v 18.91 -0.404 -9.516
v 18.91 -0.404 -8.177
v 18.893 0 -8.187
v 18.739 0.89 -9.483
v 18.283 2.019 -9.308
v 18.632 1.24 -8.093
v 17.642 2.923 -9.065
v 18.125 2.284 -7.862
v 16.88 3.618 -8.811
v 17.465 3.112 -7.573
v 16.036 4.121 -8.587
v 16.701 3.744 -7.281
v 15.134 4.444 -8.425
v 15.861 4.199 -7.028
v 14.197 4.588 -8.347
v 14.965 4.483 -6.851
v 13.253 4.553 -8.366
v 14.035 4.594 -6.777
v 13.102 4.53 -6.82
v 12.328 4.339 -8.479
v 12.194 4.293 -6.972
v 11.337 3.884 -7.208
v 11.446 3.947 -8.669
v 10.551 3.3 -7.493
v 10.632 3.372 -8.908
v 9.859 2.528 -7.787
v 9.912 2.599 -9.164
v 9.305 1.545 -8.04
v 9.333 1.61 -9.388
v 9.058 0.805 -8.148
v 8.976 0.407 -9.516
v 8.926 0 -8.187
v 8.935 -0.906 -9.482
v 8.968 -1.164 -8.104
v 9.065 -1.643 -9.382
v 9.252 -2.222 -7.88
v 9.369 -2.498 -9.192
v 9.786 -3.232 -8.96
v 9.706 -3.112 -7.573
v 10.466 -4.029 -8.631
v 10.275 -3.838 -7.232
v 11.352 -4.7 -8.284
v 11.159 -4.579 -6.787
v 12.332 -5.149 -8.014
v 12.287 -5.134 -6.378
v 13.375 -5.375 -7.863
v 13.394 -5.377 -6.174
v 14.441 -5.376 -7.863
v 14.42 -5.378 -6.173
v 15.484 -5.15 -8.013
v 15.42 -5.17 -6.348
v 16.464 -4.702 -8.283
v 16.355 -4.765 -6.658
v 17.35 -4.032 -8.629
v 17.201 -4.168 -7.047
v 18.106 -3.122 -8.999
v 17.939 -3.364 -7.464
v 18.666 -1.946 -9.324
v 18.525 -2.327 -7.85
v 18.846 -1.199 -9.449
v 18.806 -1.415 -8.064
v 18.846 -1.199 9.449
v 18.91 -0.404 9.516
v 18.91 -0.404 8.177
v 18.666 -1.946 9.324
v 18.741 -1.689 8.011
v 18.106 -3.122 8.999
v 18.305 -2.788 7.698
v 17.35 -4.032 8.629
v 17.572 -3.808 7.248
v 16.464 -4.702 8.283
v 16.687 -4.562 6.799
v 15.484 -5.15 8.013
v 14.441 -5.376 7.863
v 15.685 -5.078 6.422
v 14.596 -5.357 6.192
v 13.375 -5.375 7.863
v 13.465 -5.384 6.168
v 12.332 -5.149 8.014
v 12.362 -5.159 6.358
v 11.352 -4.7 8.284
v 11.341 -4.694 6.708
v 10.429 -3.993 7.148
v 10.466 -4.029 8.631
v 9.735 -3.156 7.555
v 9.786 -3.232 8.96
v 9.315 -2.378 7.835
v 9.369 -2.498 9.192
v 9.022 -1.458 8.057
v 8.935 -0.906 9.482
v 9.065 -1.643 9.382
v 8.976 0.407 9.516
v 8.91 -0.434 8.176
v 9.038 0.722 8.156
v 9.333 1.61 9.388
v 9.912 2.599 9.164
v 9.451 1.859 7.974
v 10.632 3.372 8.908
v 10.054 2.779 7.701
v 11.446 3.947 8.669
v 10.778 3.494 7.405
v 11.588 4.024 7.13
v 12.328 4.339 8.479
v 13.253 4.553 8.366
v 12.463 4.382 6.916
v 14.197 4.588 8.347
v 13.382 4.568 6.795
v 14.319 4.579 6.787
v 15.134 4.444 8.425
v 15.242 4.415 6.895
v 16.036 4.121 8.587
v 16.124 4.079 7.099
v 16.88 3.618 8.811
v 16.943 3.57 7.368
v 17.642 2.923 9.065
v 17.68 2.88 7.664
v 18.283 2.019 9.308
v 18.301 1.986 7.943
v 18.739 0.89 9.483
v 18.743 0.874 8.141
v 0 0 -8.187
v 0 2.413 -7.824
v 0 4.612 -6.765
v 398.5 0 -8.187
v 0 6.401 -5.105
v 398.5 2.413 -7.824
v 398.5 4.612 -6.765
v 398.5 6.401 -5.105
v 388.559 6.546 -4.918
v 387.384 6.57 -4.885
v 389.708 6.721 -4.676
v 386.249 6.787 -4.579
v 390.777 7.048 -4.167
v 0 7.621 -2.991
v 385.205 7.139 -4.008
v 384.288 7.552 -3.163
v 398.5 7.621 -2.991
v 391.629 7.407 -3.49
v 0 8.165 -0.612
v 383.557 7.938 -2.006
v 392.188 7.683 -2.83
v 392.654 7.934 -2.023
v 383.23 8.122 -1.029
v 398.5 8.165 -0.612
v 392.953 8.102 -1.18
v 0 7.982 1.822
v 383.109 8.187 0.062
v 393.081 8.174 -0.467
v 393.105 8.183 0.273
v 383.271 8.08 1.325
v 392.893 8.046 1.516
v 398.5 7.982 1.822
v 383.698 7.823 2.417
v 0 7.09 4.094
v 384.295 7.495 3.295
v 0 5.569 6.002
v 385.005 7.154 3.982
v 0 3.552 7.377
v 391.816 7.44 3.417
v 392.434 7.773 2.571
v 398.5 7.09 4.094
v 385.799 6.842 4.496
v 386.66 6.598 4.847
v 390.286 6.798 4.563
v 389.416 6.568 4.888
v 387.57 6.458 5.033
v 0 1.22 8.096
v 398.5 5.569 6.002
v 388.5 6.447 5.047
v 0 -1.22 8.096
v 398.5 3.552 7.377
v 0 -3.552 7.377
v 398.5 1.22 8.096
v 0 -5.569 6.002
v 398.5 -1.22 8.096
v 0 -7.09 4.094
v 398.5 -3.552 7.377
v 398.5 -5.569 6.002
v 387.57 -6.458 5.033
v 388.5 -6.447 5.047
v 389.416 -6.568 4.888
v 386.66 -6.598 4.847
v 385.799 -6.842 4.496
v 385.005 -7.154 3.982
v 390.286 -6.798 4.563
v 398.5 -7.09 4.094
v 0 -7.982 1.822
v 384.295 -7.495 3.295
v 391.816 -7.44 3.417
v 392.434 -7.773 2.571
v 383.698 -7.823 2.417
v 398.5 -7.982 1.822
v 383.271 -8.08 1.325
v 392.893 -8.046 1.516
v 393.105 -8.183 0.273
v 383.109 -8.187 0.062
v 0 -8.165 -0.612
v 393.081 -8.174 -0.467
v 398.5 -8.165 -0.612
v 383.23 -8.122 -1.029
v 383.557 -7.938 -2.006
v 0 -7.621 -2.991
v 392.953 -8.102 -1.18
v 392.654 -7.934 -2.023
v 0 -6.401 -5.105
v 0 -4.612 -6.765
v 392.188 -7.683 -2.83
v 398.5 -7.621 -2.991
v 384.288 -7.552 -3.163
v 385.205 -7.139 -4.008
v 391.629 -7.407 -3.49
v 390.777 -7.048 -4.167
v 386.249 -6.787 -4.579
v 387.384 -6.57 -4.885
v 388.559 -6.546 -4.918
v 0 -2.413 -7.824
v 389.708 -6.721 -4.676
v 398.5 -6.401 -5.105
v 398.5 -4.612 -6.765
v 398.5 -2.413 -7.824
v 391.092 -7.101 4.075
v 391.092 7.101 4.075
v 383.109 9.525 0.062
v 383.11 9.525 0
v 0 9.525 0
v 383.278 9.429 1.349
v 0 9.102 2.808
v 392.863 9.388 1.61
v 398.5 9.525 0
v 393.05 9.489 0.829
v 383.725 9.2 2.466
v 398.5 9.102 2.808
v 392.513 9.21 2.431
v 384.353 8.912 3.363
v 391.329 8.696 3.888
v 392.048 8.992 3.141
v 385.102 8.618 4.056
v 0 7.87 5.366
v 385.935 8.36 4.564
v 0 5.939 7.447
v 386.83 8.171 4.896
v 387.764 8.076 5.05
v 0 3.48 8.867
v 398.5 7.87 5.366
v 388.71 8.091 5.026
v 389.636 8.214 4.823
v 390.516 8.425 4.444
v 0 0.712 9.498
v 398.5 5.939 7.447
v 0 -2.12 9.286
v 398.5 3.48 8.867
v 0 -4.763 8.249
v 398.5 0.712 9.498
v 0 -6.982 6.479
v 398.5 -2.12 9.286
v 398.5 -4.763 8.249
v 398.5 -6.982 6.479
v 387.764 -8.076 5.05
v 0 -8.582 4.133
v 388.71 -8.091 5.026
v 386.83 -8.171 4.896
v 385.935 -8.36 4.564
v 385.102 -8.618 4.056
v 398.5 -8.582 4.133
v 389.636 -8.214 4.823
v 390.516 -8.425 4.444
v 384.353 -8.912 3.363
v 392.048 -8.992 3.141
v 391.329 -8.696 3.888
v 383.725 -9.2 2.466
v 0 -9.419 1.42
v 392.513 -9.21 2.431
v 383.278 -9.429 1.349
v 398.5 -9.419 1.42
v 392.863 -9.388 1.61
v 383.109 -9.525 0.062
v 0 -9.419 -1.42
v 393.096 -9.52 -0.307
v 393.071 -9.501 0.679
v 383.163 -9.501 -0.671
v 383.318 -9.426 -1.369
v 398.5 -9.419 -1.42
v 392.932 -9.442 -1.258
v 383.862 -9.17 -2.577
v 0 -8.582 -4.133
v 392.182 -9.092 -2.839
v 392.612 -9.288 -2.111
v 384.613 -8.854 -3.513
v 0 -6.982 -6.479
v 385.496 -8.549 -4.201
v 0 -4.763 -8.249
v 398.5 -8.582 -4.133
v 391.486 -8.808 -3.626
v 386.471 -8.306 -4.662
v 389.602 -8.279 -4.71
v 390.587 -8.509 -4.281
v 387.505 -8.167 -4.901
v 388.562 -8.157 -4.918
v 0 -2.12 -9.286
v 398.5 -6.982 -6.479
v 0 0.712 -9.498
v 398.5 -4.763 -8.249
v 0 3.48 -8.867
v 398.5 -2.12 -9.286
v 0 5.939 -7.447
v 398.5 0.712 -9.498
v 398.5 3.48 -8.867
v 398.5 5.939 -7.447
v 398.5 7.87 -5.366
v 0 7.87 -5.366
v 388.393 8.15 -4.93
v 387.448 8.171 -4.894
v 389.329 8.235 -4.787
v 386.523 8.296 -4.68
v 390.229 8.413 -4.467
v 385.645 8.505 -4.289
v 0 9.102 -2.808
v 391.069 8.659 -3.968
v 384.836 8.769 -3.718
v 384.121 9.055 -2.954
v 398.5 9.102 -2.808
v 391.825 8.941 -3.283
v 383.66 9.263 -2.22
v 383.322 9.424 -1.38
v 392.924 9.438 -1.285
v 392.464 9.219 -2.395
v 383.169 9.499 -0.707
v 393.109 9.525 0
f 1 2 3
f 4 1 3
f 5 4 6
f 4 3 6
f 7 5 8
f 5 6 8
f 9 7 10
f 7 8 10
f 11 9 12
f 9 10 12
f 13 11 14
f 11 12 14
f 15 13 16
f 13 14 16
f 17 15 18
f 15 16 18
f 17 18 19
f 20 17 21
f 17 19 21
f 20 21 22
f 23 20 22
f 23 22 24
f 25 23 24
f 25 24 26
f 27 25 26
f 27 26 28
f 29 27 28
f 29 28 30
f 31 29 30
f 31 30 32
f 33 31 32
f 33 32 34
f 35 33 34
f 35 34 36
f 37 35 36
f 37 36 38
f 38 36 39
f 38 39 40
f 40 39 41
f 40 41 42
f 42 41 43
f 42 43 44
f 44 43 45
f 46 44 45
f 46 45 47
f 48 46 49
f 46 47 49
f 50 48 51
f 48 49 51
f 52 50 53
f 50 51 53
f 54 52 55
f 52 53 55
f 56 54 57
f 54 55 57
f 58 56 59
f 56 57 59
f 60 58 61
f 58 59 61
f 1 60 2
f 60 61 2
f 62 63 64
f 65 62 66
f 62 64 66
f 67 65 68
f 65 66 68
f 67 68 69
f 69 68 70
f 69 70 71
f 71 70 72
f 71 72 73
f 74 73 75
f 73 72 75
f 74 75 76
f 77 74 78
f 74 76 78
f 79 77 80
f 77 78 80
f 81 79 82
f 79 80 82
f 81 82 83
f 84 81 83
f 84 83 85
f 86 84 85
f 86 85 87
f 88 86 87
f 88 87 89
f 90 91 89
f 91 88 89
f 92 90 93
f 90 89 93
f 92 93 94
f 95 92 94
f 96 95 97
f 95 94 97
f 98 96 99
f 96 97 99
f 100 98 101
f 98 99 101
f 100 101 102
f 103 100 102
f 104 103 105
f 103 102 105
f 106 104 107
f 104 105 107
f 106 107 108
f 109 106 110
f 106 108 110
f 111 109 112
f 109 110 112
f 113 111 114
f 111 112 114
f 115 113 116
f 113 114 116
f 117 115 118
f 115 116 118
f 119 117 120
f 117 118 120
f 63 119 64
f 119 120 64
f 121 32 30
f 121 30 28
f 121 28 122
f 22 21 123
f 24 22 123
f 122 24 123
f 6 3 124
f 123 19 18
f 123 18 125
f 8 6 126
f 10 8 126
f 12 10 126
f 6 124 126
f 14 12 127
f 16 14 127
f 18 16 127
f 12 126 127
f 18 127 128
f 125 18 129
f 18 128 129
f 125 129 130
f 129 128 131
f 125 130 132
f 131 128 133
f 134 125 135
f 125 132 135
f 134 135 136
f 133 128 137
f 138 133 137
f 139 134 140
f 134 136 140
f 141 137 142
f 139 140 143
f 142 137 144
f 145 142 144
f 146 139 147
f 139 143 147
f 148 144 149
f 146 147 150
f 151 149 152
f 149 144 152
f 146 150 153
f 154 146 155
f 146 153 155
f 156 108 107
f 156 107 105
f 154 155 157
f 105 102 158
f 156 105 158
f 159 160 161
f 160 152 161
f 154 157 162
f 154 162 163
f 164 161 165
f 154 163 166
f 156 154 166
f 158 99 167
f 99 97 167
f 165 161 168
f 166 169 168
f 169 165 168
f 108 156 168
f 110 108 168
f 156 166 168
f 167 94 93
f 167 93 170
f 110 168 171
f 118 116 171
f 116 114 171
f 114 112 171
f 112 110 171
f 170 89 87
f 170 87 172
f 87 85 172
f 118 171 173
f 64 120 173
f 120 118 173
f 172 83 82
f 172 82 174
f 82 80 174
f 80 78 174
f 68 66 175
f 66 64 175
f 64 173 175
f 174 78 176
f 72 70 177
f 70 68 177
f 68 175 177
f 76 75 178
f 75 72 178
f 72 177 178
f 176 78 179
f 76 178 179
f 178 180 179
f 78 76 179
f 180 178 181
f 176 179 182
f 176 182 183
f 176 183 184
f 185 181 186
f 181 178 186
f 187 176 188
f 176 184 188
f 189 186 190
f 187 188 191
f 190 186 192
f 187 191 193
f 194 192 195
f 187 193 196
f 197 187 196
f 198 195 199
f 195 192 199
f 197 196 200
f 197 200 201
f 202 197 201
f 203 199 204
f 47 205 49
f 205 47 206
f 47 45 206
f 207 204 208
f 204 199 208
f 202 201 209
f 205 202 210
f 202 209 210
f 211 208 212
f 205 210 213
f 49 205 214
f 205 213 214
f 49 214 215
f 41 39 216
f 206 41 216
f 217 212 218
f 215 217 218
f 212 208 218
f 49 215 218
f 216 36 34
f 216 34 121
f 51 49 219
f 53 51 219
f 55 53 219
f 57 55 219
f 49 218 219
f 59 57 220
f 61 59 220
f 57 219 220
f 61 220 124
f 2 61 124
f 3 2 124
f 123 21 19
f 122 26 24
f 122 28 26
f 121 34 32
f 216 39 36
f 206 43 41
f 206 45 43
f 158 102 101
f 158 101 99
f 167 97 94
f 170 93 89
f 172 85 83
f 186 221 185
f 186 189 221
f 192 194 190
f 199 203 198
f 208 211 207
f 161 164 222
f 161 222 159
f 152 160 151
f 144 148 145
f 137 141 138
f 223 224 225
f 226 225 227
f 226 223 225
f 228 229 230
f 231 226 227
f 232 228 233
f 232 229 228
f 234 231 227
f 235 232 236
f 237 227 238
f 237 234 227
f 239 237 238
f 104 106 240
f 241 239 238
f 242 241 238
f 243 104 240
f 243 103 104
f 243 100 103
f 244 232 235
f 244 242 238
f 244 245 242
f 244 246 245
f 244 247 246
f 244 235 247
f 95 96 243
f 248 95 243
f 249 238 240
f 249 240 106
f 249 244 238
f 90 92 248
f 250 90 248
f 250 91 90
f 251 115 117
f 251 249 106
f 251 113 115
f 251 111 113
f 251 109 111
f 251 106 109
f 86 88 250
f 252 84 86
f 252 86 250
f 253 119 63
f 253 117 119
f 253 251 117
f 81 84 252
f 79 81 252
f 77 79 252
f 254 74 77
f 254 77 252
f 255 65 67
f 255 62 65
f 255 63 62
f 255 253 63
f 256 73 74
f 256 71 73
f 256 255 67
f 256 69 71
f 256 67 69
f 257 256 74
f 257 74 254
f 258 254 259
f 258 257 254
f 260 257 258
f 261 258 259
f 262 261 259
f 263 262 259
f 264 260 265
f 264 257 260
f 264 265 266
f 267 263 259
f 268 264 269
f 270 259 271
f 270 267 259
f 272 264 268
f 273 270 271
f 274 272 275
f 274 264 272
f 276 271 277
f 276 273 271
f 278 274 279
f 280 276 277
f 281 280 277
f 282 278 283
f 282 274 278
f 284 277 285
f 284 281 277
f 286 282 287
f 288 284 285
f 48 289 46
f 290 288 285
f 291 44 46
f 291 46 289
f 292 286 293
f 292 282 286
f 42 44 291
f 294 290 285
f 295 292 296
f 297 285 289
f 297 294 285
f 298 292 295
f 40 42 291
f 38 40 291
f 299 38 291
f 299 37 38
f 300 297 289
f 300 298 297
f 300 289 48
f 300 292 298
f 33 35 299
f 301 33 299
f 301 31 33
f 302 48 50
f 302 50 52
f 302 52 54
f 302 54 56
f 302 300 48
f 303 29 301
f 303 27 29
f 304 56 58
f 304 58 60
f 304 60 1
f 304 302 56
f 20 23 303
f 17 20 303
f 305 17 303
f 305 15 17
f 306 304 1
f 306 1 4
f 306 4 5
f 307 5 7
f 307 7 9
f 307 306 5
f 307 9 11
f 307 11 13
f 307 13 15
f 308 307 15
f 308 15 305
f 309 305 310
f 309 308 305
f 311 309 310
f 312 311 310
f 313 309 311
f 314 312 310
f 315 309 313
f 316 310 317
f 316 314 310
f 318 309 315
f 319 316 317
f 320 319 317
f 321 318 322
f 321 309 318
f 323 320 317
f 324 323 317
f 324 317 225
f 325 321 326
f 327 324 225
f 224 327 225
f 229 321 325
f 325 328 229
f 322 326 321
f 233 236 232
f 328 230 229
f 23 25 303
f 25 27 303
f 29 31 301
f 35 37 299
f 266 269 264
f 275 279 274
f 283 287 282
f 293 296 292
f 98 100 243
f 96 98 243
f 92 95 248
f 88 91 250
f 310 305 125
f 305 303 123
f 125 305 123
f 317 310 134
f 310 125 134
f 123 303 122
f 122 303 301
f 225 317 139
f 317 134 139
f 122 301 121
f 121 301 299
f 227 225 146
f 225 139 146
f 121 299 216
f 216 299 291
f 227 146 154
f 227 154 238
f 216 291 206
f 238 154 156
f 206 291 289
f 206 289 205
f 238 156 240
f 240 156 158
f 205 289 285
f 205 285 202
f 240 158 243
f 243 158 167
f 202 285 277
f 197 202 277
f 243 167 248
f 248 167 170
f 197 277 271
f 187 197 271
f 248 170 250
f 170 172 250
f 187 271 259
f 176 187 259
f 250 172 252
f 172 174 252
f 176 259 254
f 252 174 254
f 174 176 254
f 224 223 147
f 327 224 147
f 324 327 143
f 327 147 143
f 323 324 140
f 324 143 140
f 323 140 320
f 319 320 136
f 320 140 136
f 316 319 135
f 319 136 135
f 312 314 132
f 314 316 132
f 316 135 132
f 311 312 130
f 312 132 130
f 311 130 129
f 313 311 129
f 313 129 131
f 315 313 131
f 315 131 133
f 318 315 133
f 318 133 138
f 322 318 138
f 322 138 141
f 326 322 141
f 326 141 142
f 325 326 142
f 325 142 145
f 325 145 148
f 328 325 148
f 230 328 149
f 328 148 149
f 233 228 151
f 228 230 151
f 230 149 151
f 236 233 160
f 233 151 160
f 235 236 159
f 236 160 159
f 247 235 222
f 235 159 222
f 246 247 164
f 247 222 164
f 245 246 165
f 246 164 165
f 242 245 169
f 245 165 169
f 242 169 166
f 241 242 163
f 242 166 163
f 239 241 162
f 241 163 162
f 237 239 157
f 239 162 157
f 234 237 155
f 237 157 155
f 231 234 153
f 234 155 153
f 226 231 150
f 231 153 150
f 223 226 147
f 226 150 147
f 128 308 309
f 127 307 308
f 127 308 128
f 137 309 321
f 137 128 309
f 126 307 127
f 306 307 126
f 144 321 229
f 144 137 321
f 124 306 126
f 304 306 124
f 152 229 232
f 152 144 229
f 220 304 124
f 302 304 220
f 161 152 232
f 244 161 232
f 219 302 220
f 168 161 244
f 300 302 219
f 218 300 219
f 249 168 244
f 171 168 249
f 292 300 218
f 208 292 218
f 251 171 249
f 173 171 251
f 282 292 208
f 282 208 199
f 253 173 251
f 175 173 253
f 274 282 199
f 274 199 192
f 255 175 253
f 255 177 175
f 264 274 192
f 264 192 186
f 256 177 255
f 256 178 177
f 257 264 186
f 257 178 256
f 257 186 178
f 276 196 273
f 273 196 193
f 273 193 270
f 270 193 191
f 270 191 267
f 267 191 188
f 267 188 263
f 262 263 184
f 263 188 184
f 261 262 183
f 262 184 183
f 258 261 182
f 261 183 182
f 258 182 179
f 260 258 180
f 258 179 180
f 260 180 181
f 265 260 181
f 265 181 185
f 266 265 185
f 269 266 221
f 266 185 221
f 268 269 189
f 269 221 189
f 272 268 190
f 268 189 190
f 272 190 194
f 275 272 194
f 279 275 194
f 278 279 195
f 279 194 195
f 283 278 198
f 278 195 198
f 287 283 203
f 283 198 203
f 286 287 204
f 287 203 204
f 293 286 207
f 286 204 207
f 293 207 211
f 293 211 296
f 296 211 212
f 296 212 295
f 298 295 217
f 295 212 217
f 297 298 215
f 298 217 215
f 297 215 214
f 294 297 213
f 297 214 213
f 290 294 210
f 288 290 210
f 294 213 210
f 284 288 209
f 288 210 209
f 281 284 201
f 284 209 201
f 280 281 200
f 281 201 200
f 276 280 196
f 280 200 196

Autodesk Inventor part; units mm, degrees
ref_plane "YZ Plane" through (0, 0, 0) normal (1, 0, 0) x (0, 1, 0)
ref_plane "XZ Plane" through (0, 0, 0) normal (0, 1, 0) x (-1, 0, 0)
ref_plane "XY Plane" through (0, 0, 0) normal (0, 0, 1) x (1, 0, 0)
sketch "Sketch1" plane through (0, 0, 0) normal (1, 0, 0) x (0, 1, 0)
  circle A0 centre (0, 0) radius 9.525
  dimension "d0" = 19.05
sketch "Sketch2" plane through (0, 0, 0) normal (0, 1, 0) x (-1, 0, 0)
  line L0 (0, 0) -> (-398.5, 0)
  dimension "d1" = 398.5
sweep "Sweep1" add profiles "Sketch1" path "Sketch2"
sketch "Sketch3" plane through (0, 0, 0) normal (0, 1, 0) x (-1, 0, 0)
  circle A0 centre (-388.1092, 0.0619) radius 5
  dimension "d4" = 10
extrude "Cut1" cut sketch "Sketch3" along normal through all both and the other way through all
sketch "Sketch4" plane through (398.5, 0, 0) normal (1, 0, 0) x (0, 0, -1)
  circle A0 centre (0, 0) radius 8.1874
extrude "Cut2" cut sketch "Sketch4" against normal through all
sketch "Sketch5" plane through (0, 0, 0) normal (0, 0, 1) x (1, 0, 0)
  circle A0 centre (13.9095, -0.404) radius 5
  dimension "d9" = 10
extrude "Cut3" cut sketch "Sketch5" along normal through all both and the other way through all
equation "\"d5\" = d4"
equation "\"d7\" = Thickness"
equation "\"d10\" = Thickness"
equation "\"BendRadius\" = Thickness"
equation "\"BendReliefWidth\" = Thickness"
equation "\"BendReliefDepth\" = 0.5 * Thickness"
equation "\"CornerReliefSize\" = 4 * Thickness"
equation "\"MinimumRemnant\" = 2 * Thickness"
equation "\"TransitionRadius\" = BendRadius"
equation "\"JacobiRadiusSize\" = BendRadius"
equation "\"GapSize\" = Thickness"
equation "\"Thickness\" = 0.5"
properties part number "Tubo_conexion"
